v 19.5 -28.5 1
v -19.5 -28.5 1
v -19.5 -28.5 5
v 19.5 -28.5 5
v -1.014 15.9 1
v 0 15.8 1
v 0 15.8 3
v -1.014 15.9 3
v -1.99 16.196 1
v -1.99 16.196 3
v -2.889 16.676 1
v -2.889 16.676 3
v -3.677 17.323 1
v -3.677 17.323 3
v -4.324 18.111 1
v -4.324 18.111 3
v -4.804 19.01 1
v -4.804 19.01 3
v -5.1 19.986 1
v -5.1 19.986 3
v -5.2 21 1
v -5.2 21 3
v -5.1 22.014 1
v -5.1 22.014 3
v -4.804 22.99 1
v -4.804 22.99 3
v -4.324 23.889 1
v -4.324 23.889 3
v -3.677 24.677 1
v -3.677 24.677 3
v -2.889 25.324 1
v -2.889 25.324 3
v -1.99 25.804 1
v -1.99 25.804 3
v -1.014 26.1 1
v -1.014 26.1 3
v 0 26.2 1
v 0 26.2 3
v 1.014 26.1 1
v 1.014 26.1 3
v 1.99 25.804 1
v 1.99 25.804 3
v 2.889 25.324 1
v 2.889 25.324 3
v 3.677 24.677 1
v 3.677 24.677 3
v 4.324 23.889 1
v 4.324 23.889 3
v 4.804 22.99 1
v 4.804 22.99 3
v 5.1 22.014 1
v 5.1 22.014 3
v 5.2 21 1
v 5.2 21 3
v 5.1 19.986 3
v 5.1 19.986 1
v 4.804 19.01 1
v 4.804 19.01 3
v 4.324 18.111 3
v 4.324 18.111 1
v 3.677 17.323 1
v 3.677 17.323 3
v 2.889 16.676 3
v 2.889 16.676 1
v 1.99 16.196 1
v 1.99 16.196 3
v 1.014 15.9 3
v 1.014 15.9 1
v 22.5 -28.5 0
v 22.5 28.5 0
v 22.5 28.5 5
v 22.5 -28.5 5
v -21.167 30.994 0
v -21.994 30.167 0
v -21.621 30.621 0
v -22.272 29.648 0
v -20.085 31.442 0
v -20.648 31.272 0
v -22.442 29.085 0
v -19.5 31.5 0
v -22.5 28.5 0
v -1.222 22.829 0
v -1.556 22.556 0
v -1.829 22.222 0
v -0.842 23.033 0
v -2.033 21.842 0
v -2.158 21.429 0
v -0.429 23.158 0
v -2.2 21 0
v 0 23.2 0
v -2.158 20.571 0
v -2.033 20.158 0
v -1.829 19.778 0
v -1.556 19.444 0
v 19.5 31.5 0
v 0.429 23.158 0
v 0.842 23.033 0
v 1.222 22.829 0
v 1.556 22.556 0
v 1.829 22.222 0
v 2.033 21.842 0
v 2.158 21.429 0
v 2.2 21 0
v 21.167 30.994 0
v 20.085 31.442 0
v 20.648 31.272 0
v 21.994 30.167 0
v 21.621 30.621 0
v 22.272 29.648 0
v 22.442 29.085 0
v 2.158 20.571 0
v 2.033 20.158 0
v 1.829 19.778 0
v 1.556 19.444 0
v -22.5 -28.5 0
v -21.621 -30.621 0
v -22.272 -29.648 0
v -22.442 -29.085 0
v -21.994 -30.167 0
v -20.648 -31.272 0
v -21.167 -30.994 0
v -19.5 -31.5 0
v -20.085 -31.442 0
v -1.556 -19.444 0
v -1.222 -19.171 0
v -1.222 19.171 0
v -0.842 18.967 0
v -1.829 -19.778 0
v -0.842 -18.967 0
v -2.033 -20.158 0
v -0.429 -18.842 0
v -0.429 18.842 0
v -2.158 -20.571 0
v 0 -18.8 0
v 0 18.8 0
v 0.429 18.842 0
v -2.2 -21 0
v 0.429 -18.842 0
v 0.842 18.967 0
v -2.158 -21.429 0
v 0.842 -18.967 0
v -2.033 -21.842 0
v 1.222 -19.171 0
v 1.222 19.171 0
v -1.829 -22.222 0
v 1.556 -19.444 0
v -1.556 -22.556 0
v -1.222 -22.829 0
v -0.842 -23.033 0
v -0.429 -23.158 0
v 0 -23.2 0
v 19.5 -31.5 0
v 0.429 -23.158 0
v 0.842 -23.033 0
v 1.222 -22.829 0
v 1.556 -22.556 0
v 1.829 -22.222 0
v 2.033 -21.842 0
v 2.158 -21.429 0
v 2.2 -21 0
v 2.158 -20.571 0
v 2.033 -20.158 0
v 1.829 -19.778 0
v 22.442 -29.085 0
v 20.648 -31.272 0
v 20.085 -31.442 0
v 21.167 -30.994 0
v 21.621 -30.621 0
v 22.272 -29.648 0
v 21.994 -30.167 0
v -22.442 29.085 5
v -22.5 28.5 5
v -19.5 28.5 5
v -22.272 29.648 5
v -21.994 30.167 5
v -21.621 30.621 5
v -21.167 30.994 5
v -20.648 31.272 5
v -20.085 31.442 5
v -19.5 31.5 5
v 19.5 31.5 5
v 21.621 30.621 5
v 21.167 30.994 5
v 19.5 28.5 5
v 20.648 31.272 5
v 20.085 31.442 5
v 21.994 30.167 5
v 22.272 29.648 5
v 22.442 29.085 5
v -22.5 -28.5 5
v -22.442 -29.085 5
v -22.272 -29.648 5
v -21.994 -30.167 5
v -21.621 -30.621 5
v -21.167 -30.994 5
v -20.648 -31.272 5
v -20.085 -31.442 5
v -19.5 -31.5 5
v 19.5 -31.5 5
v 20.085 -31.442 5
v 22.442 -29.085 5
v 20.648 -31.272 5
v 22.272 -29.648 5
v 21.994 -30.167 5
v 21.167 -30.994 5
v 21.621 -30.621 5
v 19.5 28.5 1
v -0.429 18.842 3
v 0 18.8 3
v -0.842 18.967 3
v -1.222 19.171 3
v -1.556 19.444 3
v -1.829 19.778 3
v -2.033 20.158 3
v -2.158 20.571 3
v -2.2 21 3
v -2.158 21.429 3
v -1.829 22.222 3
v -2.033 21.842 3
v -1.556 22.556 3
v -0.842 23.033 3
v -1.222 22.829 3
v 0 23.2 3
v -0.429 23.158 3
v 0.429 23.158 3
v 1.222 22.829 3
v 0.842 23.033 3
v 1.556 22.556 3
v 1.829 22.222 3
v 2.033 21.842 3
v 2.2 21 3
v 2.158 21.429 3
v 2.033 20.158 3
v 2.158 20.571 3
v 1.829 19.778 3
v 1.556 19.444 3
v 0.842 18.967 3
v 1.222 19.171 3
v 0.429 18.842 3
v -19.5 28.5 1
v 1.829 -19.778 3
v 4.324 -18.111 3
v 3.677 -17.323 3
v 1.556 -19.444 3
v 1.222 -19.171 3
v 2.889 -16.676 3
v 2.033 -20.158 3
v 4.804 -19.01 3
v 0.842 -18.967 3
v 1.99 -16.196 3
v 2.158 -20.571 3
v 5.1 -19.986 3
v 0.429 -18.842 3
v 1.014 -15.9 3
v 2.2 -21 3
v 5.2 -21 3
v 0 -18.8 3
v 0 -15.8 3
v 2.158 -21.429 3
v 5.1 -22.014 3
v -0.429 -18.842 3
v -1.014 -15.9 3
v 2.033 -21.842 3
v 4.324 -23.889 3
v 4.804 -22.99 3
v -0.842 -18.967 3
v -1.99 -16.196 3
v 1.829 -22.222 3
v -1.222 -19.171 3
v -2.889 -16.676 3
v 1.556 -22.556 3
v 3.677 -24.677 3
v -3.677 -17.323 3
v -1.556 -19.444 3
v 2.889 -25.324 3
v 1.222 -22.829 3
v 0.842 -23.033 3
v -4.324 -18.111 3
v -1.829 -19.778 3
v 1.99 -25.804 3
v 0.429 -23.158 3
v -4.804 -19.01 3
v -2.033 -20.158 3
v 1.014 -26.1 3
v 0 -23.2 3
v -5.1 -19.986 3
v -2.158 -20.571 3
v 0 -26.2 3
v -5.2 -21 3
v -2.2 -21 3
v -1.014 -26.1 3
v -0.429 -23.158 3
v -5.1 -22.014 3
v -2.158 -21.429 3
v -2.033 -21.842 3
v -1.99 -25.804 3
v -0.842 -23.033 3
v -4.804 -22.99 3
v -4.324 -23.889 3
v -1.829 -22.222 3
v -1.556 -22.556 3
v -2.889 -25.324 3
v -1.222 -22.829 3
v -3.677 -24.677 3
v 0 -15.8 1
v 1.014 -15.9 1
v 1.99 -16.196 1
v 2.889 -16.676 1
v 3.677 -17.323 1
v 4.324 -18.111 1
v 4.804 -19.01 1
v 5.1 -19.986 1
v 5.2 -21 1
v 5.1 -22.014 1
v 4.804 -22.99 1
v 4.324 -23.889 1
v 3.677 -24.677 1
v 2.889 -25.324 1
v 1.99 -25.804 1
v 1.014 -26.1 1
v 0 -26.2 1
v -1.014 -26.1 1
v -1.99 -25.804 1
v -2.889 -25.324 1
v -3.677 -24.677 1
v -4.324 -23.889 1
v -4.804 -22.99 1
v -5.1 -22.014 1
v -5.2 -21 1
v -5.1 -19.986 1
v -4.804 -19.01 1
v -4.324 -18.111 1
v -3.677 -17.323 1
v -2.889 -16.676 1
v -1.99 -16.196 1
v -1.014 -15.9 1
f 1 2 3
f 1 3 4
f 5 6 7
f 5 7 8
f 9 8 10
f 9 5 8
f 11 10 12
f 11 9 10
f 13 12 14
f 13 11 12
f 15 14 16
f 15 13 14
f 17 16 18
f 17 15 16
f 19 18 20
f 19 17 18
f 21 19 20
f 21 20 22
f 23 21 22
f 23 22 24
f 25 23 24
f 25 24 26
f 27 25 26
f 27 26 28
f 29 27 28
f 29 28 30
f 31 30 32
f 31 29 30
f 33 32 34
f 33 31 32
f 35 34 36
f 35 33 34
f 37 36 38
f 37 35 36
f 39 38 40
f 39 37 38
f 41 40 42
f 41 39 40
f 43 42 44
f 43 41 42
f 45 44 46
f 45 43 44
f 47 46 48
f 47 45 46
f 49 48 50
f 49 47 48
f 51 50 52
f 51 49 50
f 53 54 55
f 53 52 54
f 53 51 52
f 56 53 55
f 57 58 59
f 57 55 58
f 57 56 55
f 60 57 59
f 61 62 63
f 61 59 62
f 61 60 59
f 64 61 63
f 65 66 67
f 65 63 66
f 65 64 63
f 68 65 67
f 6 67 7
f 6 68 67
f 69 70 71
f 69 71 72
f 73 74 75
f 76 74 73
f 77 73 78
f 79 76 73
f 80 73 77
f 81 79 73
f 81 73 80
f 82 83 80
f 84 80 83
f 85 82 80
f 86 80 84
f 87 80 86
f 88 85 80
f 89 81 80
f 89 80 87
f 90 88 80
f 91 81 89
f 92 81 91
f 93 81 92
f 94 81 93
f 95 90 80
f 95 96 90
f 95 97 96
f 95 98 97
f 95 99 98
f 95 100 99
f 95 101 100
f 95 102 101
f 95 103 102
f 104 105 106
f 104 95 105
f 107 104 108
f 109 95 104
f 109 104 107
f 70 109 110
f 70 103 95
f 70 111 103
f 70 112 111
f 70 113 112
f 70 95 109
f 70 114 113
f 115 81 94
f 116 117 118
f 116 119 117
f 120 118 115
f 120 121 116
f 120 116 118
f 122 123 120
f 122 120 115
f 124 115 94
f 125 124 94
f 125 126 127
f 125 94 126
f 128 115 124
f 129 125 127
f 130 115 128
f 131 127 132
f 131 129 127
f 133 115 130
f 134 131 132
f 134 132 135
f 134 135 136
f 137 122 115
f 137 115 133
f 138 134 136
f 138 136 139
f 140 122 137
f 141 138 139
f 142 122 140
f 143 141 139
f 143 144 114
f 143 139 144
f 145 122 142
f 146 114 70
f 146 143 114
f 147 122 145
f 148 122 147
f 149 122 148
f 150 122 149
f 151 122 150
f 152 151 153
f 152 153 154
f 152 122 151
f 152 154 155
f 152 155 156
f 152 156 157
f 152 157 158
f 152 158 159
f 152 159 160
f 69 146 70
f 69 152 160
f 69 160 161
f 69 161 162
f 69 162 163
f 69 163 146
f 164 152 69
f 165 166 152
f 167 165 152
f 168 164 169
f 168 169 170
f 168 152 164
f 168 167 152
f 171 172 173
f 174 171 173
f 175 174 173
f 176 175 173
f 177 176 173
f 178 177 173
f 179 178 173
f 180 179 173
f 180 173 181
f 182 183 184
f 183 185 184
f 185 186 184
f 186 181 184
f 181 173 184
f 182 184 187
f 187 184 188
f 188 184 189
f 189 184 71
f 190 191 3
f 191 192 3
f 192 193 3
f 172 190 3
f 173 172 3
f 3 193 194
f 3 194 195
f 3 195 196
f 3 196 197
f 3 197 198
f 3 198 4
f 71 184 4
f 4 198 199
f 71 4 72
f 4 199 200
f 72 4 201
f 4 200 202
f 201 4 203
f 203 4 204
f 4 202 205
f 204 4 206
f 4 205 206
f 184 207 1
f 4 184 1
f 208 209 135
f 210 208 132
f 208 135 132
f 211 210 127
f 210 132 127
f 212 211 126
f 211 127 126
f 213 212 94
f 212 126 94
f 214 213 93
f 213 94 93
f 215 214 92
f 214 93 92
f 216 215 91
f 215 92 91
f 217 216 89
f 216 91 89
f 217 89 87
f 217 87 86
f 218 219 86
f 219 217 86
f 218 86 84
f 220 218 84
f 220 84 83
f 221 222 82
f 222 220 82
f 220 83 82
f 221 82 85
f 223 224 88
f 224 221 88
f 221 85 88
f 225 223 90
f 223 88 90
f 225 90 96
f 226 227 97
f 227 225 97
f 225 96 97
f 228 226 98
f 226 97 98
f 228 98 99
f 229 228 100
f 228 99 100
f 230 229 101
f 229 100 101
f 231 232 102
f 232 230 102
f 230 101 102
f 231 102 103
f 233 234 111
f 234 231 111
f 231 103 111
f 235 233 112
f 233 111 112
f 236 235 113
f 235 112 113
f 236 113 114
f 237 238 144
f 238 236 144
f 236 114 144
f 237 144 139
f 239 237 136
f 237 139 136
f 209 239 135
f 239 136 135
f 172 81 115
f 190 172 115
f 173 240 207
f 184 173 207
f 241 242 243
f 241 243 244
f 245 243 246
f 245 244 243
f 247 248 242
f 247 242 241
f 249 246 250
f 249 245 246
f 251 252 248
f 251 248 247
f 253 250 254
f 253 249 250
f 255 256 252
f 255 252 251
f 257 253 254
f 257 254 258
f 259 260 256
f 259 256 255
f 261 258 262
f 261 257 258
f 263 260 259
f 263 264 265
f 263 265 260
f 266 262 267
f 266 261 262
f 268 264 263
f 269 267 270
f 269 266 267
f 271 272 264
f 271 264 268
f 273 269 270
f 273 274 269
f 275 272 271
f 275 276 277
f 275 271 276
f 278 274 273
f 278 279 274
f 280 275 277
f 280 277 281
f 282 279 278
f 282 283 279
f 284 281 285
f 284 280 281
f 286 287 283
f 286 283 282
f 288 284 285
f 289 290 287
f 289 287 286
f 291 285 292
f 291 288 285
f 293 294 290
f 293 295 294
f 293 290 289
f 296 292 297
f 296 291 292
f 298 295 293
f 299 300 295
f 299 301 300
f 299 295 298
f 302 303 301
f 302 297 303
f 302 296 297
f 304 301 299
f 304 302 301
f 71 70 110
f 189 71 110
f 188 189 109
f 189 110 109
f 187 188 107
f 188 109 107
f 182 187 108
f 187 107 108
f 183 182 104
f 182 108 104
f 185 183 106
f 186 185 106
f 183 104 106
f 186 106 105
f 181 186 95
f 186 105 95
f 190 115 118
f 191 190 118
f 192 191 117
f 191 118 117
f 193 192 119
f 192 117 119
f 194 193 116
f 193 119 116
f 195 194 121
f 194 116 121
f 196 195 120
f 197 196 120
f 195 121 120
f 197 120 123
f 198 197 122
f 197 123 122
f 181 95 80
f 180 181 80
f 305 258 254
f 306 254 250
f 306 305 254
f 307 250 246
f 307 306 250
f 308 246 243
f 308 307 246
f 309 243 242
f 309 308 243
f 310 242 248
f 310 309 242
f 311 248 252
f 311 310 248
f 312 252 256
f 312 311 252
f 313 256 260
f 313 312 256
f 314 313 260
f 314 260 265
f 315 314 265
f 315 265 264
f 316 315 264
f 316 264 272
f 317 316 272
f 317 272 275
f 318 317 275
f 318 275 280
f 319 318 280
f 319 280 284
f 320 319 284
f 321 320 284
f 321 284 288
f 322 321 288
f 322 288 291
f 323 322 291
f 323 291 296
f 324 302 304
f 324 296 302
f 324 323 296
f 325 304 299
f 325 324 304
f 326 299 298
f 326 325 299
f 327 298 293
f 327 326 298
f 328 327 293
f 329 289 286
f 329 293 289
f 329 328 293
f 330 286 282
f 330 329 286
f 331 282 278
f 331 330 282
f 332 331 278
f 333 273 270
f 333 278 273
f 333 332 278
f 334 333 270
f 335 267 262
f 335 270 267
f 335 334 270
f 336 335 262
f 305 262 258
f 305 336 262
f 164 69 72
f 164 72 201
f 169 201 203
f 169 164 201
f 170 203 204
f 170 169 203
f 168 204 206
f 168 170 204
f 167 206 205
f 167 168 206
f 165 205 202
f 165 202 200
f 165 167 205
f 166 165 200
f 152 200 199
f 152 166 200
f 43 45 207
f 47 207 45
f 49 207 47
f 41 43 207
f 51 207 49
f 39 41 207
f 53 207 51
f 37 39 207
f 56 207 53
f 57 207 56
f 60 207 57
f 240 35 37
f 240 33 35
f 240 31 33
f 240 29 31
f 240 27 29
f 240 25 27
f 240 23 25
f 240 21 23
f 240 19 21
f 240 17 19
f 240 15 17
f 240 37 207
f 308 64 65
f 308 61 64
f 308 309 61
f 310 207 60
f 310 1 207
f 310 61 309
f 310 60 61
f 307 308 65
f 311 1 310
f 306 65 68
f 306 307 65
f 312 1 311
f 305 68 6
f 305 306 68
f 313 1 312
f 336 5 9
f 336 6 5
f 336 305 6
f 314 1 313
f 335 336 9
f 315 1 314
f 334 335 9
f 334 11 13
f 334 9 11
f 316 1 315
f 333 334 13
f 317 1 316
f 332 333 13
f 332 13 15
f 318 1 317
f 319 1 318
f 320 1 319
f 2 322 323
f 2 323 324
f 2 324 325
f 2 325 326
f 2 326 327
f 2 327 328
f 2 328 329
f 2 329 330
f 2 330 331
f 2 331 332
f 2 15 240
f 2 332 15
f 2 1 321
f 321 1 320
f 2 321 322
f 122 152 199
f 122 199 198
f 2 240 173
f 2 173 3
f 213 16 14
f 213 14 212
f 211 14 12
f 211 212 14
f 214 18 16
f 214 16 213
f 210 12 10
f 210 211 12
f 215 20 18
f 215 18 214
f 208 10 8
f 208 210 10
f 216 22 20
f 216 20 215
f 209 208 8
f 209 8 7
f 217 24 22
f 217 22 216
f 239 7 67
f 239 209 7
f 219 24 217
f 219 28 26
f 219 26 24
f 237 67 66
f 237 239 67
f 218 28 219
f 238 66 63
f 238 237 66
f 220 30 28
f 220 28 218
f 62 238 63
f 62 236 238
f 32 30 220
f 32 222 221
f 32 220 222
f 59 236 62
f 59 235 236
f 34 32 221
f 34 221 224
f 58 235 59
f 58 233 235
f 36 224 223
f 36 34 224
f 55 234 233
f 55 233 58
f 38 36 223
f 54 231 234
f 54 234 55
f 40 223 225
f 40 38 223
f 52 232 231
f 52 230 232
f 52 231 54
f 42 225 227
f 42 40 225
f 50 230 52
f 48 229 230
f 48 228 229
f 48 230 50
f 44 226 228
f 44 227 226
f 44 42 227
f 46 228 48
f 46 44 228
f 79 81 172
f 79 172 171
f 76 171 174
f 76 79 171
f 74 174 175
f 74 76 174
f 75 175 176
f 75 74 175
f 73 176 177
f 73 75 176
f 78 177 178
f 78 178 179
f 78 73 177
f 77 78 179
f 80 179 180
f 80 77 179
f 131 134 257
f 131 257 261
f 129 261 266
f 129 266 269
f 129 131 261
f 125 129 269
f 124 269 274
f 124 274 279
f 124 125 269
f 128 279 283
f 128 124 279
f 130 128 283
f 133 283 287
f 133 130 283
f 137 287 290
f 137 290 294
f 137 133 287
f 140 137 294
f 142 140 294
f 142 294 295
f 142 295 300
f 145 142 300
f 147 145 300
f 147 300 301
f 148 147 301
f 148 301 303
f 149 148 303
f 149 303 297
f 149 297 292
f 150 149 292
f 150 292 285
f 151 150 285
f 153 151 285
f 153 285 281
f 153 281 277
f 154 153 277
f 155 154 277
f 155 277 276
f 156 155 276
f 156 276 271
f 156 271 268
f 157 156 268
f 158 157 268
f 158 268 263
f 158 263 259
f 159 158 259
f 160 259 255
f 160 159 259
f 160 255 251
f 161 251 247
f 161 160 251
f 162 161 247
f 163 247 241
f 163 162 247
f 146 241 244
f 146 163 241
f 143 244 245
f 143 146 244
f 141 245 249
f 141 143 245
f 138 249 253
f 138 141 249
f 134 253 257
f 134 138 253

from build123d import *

# Parameters (mm, degrees)
PAD_DEPTH               = 1
PAD001_DEPTH            = 3
PAD002_DEPTH            = 5
PAD_MIRRORED_2_DEPTH    = 1
PAD001_MIRRORED_2_DEPTH = 3
PAD002_MIRRORED_2_DEPTH = 5


with BuildPart() as part:
    # Sketch → Pad (new body)
    with BuildSketch(Plane.XY):
        with BuildLine():
            Line((0, 0), (19.5, 0))
            Line((19.5, 0), (19.5, 28.5))
            Line((19.5, 28.5), (0, 28.5))
            Line((0, 28.5), (0, 23.2))
            ThreePointArc((0, 18.8), (2.2, 21), (0, 23.2))
            Line((0, 18.8), (0, 0))
        make_face()
    pad = extrude(amount=PAD_DEPTH)

    # Sketch001 → Pad001 (join)
    with BuildSketch(Plane.XY):
        with BuildLine():
            ThreePointArc((0, 18.8), (2.2, 21), (0, 23.2))
            Line((0, 23.2), (0, 26.2))
            ThreePointArc((0, 15.8), (5.2, 21), (0, 26.2))
            Line((0, 18.8), (0, 15.8))
        make_face()
    pad001 = extrude(amount=PAD001_DEPTH)

    # Sketch002 → Pad002 (join)
    with BuildSketch(Plane.XY):
        with BuildLine():
            Line((19.5, 0), (19.5, 28.5))
            Line((19.5, 28.5), (0, 28.5))
            Line((0, 28.5), (0, 31.5))
            Line((0, 31.5), (19.5, 31.5))
            ThreePointArc((22.5, 28.5), (21.62132, 30.62132), (19.5, 31.5))
            Line((22.5, 0), (22.5, 28.5))
            Line((19.5, 0), (22.5, 0))
        make_face()
    pad002 = extrude(amount=PAD002_DEPTH)

    # Sketch Mirrored 2 → Pad Mirrored 2 (add)
    with BuildSketch(Plane(origin=(0, 0, 0), x_dir=(-1, 0, 0), z_dir=(0, 0, -1))):
        with BuildLine():
            Line((0, 0), (19.5, 0))
            Line((19.5, 0), (19.5, 28.5))
            Line((19.5, 28.5), (0, 28.5))
            Line((0, 28.5), (0, 23.2))
            ThreePointArc((0, 18.8), (2.2, 21), (0, 23.2))
            Line((0, 18.8), (0, 0))
        make_face()
    pad_mirrored_2 = extrude(amount=-PAD_MIRRORED_2_DEPTH)

    # Sketch001 Mirrored 2 → Pad001 Mirrored 2 (add)
    with BuildSketch(Plane(origin=(0, 0, 0), x_dir=(-1, 0, 0), z_dir=(0, 0, -1))):
        with BuildLine():
            ThreePointArc((0, 18.8), (2.2, 21), (0, 23.2))
            Line((0, 23.2), (0, 26.2))
            ThreePointArc((0, 15.8), (5.2, 21), (0, 26.2))
            Line((0, 18.8), (0, 15.8))
        make_face()
    pad001_mirrored_2 = extrude(amount=-PAD001_MIRRORED_2_DEPTH)

    # Sketch002 Mirrored 2 → Pad002 Mirrored 2 (add)
    with BuildSketch(Plane(origin=(0, 0, 0), x_dir=(-1, 0, 0), z_dir=(0, 0, -1))):
        with BuildLine():
            Line((19.5, 0), (19.5, 28.5))
            Line((19.5, 28.5), (0, 28.5))
            Line((0, 28.5), (0, 31.5))
            Line((0, 31.5), (19.5, 31.5))
            ThreePointArc((22.5, 28.5), (21.62132, 30.62132), (19.5, 31.5))
            Line((22.5, 0), (22.5, 28.5))
            Line((19.5, 0), (22.5, 0))
        make_face()
    pad002_mirrored_2 = extrude(amount=-PAD002_MIRRORED_2_DEPTH)

    # Mirrored001: Pad, Pad001, Pad002, Pad Mirrored 2, Pad001 Mirrored 2, Pad002 Mirrored 2 across Sketch H_Axis
    add(pad.mirror(Plane.ZX))
    add(pad001.mirror(Plane.ZX))
    add(pad002.mirror(Plane.ZX))
    add(pad_mirrored_2.mirror(Plane.ZX))
    add(pad001_mirrored_2.mirror(Plane.ZX))
    add(pad002_mirrored_2.mirror(Plane.ZX))


solid = part.part
